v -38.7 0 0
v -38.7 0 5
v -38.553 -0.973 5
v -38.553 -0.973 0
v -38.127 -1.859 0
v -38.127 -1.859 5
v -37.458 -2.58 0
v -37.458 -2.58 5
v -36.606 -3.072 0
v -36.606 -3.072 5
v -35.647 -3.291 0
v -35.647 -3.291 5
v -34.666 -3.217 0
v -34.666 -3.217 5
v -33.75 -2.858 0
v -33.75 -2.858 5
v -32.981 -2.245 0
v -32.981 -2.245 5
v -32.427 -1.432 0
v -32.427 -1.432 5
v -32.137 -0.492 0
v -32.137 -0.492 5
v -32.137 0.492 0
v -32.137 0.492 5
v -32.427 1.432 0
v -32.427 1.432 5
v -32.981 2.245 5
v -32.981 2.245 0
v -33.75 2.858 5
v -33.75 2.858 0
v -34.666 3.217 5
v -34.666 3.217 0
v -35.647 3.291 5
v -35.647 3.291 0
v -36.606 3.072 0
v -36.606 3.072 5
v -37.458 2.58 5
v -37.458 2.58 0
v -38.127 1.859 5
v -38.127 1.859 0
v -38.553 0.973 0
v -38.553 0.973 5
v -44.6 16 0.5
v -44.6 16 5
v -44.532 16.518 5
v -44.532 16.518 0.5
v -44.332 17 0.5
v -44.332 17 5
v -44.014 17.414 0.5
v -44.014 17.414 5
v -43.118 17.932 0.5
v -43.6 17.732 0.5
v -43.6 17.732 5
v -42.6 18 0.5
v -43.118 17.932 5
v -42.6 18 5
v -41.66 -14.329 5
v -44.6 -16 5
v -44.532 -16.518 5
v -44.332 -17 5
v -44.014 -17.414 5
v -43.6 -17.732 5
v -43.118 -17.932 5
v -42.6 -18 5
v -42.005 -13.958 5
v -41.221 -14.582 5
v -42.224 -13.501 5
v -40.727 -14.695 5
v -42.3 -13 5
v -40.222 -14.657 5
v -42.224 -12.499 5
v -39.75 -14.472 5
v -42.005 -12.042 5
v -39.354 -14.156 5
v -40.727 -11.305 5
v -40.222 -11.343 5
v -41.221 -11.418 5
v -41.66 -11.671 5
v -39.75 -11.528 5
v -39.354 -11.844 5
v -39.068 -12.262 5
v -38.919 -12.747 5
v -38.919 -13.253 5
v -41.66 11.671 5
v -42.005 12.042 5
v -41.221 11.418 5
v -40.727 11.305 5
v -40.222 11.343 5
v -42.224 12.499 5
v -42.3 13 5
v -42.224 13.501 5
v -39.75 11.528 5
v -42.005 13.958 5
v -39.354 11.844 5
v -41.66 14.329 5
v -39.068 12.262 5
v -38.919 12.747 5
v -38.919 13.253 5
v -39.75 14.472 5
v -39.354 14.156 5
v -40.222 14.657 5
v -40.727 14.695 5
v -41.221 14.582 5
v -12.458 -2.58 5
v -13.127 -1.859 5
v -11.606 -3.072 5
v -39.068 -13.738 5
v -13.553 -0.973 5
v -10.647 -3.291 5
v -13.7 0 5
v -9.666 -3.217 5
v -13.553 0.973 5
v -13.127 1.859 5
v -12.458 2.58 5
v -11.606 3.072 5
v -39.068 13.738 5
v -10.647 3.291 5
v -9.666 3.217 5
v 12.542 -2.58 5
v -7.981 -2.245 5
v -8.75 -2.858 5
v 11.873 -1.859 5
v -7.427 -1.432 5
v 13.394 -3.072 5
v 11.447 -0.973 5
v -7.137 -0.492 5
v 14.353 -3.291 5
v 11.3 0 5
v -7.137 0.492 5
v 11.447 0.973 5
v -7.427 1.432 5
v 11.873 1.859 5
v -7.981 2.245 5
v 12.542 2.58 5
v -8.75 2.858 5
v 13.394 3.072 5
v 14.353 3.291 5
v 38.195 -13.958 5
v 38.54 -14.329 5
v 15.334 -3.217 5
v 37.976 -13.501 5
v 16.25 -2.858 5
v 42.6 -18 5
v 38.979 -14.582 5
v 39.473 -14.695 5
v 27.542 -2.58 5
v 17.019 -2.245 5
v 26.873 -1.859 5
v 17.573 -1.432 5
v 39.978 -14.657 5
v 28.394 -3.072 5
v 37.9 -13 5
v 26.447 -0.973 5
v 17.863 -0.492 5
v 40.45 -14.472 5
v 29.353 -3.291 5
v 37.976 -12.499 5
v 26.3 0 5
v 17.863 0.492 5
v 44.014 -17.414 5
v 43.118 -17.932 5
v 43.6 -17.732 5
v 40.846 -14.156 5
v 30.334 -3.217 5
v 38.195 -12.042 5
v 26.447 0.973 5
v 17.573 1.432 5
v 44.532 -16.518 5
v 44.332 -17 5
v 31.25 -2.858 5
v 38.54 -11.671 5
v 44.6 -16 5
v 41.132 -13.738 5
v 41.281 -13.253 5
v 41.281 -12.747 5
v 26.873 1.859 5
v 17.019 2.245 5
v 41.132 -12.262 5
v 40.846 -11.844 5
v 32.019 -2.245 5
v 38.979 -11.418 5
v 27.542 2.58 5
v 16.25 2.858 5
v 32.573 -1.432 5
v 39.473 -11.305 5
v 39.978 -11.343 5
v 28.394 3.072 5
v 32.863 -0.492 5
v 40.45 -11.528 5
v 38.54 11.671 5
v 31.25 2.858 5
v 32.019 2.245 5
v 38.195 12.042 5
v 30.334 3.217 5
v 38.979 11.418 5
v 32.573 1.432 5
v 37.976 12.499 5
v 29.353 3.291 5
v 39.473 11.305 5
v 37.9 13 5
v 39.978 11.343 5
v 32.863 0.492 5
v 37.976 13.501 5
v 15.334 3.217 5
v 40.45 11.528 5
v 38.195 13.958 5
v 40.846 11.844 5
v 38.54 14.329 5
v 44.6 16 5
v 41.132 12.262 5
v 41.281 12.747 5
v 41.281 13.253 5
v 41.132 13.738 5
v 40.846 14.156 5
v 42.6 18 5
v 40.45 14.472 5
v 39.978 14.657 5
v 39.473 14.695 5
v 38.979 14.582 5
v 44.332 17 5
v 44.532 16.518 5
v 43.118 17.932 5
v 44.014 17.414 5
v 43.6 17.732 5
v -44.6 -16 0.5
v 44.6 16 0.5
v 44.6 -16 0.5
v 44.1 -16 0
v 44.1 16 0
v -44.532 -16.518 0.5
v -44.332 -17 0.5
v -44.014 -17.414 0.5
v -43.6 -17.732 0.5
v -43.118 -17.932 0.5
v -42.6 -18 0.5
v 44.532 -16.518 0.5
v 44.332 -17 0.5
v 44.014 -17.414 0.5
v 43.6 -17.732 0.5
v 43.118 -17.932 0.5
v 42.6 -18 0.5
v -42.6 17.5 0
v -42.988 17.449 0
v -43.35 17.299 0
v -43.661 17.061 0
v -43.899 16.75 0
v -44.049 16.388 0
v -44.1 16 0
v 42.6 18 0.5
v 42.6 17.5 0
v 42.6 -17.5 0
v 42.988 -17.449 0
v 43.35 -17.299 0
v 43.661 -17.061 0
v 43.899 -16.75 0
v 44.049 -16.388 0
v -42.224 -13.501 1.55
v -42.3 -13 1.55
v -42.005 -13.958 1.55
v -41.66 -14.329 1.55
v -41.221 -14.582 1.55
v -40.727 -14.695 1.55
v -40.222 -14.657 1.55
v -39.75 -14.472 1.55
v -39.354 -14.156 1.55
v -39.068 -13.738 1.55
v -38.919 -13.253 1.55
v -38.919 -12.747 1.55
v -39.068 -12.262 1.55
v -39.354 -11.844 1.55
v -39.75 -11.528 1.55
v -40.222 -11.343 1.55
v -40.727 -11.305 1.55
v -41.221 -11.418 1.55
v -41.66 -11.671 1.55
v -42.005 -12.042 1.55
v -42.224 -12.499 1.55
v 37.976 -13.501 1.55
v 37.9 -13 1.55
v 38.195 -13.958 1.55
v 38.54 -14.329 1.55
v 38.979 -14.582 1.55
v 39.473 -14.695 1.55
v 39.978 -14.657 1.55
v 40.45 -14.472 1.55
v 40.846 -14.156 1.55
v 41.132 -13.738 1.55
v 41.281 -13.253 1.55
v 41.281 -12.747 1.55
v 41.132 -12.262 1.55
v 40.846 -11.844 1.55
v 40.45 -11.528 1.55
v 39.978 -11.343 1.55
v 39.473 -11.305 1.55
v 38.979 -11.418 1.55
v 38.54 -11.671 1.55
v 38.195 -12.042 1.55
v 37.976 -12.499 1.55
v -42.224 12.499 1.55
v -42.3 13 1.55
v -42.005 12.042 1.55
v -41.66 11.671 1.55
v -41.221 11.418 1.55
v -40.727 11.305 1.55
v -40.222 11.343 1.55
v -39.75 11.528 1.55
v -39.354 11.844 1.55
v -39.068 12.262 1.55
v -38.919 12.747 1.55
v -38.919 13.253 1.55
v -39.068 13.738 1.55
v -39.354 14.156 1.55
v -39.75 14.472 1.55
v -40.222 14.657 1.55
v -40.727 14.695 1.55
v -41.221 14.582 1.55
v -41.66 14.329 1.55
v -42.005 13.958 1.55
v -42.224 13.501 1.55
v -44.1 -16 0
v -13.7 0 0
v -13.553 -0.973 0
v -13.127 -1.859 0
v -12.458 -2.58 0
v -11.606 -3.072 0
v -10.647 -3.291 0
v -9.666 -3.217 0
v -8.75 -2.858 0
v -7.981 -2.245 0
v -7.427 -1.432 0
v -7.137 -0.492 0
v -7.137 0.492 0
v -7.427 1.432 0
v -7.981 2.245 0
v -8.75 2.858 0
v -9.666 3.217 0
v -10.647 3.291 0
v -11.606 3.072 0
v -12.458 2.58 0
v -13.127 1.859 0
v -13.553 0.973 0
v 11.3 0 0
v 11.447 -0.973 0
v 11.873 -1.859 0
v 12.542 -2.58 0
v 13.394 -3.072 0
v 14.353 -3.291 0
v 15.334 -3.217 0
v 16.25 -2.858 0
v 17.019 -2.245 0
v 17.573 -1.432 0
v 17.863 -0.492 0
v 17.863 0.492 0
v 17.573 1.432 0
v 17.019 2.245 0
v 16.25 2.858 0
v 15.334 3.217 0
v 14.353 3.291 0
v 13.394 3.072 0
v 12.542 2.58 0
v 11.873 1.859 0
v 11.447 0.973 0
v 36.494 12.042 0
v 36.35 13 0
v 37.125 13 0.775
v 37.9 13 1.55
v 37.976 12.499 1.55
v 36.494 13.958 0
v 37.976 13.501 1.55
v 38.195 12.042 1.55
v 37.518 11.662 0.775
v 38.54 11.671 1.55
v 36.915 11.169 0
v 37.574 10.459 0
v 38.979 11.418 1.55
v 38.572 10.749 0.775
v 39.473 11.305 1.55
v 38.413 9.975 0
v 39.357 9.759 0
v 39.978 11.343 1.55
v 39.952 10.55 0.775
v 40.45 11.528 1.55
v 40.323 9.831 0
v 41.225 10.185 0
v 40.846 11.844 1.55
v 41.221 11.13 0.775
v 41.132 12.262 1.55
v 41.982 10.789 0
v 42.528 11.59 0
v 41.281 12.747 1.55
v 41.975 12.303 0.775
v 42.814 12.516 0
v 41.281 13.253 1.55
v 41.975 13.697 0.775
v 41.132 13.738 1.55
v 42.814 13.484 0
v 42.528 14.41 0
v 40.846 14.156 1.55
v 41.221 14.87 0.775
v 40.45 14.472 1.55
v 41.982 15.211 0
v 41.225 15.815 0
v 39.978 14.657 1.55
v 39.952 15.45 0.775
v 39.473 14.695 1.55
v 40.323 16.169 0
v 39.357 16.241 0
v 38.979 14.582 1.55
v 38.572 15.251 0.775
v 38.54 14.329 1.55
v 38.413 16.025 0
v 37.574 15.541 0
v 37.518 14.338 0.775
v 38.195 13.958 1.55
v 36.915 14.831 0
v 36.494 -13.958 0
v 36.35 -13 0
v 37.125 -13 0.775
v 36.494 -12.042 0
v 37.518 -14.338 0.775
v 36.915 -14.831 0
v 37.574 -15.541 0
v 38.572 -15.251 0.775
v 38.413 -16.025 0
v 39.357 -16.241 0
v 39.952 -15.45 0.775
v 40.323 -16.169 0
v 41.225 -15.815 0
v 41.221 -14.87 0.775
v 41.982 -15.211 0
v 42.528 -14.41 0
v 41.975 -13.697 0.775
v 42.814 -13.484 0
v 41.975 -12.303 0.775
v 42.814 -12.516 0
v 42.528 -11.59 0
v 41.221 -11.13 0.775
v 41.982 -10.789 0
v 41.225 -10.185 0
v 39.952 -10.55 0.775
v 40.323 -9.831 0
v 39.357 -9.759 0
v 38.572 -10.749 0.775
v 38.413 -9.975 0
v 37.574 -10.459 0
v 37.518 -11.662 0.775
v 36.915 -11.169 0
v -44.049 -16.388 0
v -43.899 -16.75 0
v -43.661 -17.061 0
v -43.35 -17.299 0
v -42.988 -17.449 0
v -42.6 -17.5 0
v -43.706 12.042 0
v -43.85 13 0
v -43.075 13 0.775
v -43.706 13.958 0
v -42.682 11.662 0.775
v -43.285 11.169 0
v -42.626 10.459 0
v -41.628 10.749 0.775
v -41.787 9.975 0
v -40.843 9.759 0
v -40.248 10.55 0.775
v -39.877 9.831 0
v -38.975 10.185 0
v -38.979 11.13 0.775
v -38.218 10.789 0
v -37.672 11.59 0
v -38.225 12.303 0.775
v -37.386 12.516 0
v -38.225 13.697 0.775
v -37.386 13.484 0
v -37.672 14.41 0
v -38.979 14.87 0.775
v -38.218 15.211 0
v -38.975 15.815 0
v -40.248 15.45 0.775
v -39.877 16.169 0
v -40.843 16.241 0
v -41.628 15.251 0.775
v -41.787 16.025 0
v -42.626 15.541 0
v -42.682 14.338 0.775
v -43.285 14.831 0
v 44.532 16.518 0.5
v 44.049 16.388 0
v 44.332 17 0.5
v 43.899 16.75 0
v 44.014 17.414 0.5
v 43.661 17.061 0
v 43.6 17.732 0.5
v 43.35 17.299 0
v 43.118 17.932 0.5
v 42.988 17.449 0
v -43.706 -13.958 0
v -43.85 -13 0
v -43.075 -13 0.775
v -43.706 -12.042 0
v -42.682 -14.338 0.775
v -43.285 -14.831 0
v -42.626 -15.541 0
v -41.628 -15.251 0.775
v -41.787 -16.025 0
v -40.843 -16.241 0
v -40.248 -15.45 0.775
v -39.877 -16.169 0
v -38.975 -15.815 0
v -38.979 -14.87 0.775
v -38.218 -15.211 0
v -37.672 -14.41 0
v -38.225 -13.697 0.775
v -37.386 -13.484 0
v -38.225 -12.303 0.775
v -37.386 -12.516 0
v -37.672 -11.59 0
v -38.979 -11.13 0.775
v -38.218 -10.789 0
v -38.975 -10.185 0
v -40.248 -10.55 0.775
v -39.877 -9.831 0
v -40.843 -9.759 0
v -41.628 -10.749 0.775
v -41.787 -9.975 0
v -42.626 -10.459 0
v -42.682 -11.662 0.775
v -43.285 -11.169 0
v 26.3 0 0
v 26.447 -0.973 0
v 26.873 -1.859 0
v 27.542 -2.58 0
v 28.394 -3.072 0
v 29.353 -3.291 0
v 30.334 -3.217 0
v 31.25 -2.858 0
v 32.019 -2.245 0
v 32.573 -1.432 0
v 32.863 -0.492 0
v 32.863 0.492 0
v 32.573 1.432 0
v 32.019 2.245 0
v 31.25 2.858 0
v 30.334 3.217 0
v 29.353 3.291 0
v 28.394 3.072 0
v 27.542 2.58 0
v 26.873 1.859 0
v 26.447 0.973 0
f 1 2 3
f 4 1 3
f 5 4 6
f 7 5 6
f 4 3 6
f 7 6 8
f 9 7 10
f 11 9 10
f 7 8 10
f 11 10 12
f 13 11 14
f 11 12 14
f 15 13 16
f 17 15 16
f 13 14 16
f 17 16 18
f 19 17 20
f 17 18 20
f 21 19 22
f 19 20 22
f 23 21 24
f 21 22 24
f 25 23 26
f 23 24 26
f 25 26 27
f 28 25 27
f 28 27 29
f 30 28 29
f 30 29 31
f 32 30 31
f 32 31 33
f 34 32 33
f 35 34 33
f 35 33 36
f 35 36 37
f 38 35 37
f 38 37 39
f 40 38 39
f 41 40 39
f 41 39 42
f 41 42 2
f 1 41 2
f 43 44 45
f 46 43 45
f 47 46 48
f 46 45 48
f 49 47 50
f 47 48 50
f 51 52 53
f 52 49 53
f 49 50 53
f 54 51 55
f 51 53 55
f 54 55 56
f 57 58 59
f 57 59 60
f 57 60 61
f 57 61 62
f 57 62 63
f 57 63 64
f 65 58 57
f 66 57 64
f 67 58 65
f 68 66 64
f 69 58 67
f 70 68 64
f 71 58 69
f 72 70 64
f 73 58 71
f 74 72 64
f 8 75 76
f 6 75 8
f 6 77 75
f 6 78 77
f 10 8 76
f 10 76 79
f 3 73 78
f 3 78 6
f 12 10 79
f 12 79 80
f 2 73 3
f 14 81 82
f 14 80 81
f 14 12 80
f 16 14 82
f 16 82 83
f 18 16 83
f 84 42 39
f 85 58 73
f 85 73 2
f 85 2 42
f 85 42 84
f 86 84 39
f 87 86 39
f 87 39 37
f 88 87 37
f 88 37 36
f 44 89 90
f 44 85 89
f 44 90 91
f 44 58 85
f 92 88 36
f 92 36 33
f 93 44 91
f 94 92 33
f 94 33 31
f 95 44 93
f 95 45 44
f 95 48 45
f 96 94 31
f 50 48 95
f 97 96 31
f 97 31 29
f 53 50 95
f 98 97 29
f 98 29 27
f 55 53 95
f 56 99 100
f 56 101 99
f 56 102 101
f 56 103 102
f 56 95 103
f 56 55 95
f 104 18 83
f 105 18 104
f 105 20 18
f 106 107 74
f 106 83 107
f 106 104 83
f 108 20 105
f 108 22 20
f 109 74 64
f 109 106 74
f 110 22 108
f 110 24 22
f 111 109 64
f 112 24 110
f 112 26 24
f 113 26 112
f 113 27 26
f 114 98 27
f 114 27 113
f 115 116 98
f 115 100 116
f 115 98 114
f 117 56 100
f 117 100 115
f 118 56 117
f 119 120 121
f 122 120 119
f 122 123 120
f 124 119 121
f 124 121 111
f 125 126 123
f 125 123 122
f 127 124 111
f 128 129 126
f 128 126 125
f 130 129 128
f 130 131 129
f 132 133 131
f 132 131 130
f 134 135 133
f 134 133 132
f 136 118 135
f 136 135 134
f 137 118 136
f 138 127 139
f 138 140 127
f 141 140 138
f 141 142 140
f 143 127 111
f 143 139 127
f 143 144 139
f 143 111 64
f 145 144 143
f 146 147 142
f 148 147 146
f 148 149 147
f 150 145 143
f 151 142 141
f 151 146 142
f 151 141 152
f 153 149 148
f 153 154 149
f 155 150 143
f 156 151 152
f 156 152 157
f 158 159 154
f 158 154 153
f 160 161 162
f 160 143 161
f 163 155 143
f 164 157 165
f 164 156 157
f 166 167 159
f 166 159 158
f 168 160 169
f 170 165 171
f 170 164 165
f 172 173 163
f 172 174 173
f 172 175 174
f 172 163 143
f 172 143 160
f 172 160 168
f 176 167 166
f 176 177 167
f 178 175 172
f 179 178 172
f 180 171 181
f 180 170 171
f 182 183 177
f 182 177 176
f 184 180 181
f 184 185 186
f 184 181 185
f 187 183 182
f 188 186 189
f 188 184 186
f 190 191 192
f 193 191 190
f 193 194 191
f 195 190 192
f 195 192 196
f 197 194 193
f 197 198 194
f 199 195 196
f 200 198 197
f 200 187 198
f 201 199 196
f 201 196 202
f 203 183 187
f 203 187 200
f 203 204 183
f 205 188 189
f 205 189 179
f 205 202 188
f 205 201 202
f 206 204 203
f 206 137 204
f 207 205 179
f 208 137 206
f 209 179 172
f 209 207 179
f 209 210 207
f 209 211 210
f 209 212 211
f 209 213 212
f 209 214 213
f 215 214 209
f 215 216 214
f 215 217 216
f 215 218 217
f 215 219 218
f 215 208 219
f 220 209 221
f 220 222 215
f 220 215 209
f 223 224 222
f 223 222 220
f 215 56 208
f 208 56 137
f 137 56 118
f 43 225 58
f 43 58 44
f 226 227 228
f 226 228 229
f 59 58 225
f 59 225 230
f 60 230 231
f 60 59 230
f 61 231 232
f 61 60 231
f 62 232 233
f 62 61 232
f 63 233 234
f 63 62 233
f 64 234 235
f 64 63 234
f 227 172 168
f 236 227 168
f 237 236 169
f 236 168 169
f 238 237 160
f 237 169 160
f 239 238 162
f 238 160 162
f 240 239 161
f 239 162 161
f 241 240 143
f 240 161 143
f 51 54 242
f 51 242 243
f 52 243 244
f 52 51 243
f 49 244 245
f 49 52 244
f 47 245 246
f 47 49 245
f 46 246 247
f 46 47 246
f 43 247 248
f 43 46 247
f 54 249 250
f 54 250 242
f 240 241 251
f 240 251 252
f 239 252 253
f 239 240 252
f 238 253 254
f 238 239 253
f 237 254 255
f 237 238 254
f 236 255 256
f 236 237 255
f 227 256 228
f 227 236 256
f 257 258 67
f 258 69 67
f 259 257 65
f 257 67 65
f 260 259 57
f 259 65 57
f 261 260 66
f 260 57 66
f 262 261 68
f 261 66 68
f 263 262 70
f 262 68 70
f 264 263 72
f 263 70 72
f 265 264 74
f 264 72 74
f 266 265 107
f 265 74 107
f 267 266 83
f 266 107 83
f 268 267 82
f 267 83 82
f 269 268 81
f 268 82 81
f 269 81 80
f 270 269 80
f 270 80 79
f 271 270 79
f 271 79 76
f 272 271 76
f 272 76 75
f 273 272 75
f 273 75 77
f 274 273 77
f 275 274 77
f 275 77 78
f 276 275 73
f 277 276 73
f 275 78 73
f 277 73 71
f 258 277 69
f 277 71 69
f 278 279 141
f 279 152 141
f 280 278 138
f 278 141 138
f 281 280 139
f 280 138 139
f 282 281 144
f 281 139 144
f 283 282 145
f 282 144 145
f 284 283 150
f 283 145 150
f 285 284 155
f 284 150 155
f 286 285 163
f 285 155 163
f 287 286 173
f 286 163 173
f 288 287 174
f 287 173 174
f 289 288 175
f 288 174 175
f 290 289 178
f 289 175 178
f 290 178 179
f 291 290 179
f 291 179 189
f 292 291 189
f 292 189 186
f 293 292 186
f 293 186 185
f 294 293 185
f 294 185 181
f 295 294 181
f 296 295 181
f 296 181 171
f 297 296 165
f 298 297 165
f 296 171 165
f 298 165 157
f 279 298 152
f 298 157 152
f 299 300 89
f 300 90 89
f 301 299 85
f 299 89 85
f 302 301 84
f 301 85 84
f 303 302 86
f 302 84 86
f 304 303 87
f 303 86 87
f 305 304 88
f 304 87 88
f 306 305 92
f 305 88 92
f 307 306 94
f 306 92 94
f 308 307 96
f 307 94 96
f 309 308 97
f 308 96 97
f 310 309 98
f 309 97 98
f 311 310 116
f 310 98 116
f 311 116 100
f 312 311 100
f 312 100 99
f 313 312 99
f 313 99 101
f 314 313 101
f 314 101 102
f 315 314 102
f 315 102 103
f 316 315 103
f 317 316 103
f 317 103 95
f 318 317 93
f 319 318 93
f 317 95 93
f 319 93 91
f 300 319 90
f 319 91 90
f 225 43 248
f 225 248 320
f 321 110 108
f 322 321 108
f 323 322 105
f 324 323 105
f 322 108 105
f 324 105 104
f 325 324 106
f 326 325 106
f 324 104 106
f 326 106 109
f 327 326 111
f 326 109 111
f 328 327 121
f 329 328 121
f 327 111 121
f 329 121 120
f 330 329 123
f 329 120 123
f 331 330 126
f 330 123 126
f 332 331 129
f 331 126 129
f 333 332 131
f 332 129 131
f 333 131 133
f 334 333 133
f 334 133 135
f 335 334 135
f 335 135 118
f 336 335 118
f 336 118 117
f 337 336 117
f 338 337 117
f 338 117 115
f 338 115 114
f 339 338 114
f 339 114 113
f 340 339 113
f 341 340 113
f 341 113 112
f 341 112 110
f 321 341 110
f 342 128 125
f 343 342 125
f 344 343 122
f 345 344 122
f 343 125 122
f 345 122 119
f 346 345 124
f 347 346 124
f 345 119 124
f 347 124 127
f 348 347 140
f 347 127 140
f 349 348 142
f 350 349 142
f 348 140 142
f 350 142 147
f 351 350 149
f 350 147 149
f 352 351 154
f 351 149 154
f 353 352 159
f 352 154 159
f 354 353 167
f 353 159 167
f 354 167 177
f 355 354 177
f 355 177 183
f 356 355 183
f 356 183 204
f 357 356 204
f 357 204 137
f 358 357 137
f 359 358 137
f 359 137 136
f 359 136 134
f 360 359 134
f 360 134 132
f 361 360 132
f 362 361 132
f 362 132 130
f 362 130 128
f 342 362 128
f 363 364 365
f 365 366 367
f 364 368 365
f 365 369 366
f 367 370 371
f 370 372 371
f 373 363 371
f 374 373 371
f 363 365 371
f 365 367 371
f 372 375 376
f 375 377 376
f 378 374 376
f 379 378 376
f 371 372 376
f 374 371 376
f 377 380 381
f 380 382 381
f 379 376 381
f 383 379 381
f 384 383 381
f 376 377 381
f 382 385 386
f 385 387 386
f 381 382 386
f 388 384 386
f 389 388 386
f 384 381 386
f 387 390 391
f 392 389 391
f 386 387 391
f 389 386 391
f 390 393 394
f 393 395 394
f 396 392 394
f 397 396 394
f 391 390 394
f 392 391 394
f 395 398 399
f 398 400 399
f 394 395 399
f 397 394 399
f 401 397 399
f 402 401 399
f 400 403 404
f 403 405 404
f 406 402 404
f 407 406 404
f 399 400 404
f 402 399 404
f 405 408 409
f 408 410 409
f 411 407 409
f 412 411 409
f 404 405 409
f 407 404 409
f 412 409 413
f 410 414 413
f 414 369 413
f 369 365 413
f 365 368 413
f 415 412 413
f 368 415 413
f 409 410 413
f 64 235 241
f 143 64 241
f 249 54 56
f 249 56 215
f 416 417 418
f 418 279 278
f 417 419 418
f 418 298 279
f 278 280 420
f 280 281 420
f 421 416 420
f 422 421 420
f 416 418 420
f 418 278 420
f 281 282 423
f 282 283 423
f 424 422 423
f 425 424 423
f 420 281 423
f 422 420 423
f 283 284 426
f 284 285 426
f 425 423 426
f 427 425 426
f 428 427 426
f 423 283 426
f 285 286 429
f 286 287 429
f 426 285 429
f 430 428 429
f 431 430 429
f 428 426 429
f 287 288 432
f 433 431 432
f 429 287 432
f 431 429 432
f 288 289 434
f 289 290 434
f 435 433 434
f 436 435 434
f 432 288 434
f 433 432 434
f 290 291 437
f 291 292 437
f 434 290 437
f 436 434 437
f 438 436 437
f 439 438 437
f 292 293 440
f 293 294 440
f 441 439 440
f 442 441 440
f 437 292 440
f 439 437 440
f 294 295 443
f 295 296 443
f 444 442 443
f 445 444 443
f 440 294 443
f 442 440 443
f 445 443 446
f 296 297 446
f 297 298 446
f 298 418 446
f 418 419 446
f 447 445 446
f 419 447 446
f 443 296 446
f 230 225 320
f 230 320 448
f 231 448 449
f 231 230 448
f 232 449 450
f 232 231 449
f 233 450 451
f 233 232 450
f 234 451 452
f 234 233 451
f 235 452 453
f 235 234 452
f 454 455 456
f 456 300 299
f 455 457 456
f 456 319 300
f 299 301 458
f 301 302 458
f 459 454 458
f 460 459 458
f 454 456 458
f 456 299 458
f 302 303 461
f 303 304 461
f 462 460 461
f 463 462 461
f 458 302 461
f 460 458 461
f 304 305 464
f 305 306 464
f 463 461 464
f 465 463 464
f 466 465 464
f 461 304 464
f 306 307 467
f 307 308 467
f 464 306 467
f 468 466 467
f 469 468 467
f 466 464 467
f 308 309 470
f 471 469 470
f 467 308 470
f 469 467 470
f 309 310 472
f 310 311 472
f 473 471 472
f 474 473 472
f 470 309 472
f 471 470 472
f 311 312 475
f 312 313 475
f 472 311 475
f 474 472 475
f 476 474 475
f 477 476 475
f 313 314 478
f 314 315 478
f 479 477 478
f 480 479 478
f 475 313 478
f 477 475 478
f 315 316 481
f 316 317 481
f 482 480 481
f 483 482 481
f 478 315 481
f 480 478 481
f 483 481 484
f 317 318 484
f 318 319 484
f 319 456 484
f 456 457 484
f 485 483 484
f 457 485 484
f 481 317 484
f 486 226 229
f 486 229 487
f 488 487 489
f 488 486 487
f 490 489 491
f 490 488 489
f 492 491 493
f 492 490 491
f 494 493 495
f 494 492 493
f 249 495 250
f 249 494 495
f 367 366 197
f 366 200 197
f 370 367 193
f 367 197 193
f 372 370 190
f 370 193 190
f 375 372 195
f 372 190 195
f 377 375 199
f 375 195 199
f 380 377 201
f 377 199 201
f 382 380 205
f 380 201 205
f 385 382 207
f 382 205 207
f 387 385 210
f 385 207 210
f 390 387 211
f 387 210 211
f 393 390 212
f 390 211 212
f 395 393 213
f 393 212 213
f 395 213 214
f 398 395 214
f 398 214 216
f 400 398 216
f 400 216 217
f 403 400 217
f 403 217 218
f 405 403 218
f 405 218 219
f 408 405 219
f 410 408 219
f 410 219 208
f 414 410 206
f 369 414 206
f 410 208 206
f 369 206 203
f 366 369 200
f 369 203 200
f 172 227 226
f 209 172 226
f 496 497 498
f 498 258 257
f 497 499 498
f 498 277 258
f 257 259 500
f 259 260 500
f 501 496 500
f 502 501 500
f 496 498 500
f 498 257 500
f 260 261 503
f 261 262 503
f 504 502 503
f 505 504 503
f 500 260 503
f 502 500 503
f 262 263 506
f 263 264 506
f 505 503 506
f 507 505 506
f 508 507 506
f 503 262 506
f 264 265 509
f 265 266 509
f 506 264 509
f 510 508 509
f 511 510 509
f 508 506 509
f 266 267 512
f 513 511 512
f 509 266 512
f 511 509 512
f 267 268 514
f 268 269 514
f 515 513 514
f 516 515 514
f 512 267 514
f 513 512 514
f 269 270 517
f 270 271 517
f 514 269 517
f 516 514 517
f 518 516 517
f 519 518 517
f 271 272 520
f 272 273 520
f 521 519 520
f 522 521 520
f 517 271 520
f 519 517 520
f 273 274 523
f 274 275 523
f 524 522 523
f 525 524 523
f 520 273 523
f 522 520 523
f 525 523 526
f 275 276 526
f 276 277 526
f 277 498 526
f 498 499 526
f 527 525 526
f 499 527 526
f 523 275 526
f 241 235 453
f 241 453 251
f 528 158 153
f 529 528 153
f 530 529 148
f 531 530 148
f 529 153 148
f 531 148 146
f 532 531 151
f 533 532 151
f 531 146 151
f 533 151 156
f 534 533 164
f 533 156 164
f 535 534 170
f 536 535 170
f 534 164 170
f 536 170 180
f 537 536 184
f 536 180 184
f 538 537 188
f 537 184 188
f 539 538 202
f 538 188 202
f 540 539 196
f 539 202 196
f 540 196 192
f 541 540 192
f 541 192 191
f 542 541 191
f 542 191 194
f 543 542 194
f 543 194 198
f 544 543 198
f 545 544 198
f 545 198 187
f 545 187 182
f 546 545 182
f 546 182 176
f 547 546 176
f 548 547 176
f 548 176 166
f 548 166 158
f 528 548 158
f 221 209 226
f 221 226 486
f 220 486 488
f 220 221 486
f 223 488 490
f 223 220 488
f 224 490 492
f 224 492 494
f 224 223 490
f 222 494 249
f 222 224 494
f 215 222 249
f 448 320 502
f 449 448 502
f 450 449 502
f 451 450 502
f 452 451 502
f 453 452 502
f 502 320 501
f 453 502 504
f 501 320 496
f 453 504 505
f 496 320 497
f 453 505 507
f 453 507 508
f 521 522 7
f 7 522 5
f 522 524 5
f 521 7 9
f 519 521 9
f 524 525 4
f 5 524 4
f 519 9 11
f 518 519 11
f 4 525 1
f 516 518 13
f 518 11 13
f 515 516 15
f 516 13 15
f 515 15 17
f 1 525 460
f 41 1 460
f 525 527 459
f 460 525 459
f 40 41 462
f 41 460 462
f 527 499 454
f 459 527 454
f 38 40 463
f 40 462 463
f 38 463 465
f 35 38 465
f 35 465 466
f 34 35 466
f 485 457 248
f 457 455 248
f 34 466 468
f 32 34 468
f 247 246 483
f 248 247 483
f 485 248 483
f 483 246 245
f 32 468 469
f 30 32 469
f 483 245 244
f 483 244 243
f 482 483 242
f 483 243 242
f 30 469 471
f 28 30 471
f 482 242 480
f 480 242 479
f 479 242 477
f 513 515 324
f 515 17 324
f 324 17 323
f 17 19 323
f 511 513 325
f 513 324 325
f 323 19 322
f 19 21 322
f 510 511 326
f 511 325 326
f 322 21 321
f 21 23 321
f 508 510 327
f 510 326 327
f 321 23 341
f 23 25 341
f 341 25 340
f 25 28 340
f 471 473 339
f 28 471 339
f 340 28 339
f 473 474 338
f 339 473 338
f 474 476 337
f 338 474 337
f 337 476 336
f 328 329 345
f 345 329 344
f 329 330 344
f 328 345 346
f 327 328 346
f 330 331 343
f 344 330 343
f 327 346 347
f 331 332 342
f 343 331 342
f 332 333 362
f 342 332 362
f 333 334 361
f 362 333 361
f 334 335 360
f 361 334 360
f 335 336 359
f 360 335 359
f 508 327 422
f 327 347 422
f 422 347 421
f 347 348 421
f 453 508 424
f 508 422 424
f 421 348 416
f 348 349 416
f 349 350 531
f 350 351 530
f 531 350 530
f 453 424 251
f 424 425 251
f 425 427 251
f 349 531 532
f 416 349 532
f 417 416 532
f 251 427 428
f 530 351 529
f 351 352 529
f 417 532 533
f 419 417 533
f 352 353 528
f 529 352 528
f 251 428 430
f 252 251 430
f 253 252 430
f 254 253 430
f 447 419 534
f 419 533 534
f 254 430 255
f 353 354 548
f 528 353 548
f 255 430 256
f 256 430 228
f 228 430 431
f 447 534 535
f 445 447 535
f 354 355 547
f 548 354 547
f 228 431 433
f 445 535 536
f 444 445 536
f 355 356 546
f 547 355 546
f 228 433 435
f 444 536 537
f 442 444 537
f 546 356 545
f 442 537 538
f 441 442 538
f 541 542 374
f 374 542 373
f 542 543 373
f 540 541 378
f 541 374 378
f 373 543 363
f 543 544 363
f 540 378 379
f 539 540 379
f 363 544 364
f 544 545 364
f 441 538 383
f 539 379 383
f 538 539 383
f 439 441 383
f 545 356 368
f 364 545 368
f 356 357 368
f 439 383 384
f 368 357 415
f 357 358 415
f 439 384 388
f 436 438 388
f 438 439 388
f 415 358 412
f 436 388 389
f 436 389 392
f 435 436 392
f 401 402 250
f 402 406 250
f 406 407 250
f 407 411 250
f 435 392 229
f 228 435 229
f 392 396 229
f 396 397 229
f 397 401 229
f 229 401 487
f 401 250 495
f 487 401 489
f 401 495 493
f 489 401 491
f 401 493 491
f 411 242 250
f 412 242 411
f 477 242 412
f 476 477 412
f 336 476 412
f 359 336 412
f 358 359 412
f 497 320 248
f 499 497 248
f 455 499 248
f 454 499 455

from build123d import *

# Parameters (mm, degrees)
F0_W           = 89.2
F0_H           = 36
F1_DEPTH       = 5
F2_D           = 6.6
F2_DEPTH       = 15
F2_TIP         = 1.9828400428
F3_D           = 3.4
F3_DEPTH       = 15
F3_CSINK_D     = 6.5
F3_CSINK_ANGLE = 90
F3_TIP         = 1.0214630523
F4_R           = 2
F5_SIZE        = 0.5


with BuildPart() as f1:
    # F0 (on Top) → F1 (new body)
    with BuildSketch(Plane.XY):
        Rectangle(F0_W, F0_H)
    extrude(amount=F1_DEPTH)

    # F2
    with Locations(Plane(origin=(0, 0, 0), x_dir=(1, 0, 0), z_dir=(0, 0, -1))):
        with Locations((-35.4, 0), (-10.4, 0), (14.6, 0), (29.6, 0)):
            Hole(F2_D / 2, depth=F2_DEPTH)
            with Locations((0, 0, -(F2_DEPTH + F2_TIP / 2))):  # 118° drill point
                Cone(0, F2_D / 2, F2_TIP, mode=Mode.SUBTRACT)

    # F3
    with Locations(Plane(origin=(0, 0, 0), x_dir=(1, 0, 0), z_dir=(0, 0, -1))):
        with Locations((-40.6, 13), (-40.6, -13), (39.6, -13), (39.6, 13)):
            CounterSinkHole(F3_D / 2, F3_CSINK_D / 2, depth=F3_DEPTH, counter_sink_angle=F3_CSINK_ANGLE)
            with Locations((0, 0, -(F3_DEPTH + F3_TIP / 2))):  # 118° drill point
                Cone(0, F3_D / 2, F3_TIP, mode=Mode.SUBTRACT)

    # F4
    f4_edges = [f1.edges().sort_by_distance(p)[0] for p in [
        (-44.6, 18, 2.5),
        (44.6, 18, 2.5),
        (-44.6, -18, 2.5),
        (44.6, -18, 2.5),
    ]]
    fillet(f4_edges, radius=F4_R)

    # F5
    f5_edges = [f1.edges().sort_by_distance(p)[0] for p in [
        (44.6, 0, 0),
    ]]
    chamfer(f5_edges, length=F5_SIZE)


solid = f1.part
